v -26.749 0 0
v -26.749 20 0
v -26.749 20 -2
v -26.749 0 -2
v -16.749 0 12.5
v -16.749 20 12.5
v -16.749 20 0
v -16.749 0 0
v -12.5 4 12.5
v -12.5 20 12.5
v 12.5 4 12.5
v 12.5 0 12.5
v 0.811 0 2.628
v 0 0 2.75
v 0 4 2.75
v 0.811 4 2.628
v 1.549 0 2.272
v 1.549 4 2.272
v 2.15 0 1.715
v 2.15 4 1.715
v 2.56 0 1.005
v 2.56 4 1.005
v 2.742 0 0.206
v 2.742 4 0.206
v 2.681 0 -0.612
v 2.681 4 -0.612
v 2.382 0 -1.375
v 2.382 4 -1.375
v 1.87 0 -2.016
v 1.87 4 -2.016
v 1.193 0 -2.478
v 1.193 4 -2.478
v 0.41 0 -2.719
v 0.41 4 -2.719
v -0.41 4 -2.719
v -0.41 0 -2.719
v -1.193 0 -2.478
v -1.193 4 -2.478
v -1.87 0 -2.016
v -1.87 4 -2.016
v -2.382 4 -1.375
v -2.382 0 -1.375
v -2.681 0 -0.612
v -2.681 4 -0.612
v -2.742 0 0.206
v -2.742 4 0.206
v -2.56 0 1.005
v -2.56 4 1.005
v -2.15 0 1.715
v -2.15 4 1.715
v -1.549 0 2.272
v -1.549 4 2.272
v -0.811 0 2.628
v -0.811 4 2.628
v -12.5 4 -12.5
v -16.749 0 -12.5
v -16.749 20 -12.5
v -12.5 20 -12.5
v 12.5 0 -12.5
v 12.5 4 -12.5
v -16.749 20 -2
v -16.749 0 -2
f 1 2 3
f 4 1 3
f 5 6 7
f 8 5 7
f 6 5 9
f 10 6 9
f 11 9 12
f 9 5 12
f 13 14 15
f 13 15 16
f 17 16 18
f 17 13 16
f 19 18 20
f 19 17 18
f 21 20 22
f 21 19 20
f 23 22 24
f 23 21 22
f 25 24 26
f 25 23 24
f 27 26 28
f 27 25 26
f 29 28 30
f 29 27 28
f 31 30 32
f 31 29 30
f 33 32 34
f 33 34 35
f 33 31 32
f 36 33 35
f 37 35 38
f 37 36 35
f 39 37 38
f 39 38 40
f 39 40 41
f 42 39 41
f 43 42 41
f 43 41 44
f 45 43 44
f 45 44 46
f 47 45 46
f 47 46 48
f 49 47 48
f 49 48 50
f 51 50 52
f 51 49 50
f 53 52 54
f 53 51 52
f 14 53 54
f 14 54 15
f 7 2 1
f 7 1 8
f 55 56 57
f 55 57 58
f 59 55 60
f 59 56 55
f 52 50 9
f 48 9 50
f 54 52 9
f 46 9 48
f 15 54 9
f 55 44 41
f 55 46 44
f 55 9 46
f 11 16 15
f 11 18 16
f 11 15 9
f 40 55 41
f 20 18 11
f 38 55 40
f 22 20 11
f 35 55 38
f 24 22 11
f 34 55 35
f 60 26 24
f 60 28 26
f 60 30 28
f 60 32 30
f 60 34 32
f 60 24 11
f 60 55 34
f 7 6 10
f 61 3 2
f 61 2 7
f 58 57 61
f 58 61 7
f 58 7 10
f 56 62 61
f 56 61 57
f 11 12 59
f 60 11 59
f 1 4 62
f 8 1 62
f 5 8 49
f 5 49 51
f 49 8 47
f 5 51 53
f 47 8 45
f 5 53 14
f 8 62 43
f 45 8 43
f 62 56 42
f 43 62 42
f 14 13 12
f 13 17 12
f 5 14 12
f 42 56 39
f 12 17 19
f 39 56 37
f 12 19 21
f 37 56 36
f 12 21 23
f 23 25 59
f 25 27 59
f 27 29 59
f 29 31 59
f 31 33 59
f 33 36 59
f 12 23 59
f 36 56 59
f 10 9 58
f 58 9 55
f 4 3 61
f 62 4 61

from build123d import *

# Parameters (mm, degrees)
SKETCH_1_W          = 25
SKETCH_1_H          = 25
SKETCH_1_R          = 2.75
EXTRUDE_1_DEPTH     = 4
SKETCH_1_3_W        = 15
SKETCH_1_3_H        = 25
EXTRUDE_2_DEPTH     = 20
SKETCH_2_W          = 10.750885586
SKETCH_2_H          = 25
CUT_EXTRUDE_1_DEPTH = 43
SKETCH_3_W          = 10
SKETCH_3_H          = 2
EXTRUDE_4_DEPTH     = 20


with BuildPart() as part:
    # 草图1 → 凸台-拉伸1 (new body)
    with BuildSketch(Plane(origin=(0, 0, 0), x_dir=(1, 0, 0), z_dir=(0, 1, 0))):
        Rectangle(SKETCH_1_W, SKETCH_1_H)
        with Locations(Location((0, 0, 0), (0, 0, 270))):
            Circle(SKETCH_1_R, mode=Mode.SUBTRACT)
    extrude(amount=EXTRUDE_1_DEPTH)

    # 草图1<3> → 凸台-拉伸2 (add)
    with BuildSketch(Plane(origin=(0, 0, 0), x_dir=(1, 0, 0), z_dir=(0, 1, 0))):
        with Locations((-20, 0)):
            Rectangle(SKETCH_1_3_W, SKETCH_1_3_H)
    extrude(amount=EXTRUDE_2_DEPTH)

    # 草图2 → 切除-拉伸1 (cut)
    with BuildSketch(Plane(origin=(0, 20, 0), x_dir=(1, 0, 0), z_dir=(0, 1, 0))):
        with Locations((-22.124557207, 0)):
            Rectangle(SKETCH_2_W, SKETCH_2_H)
    extrude(amount=-CUT_EXTRUDE_1_DEPTH, mode=Mode.SUBTRACT)

    # 草图3 → 凸台-拉伸4 (add)
    with BuildSketch(Plane(origin=(0, 20, 0), x_dir=(1, 0, 0), z_dir=(0, 1, 0))):
        with Locations((-21.749114414, 1)):
            Rectangle(SKETCH_3_W, SKETCH_3_H)
    extrude(amount=-EXTRUDE_4_DEPTH)


solid = part.part
